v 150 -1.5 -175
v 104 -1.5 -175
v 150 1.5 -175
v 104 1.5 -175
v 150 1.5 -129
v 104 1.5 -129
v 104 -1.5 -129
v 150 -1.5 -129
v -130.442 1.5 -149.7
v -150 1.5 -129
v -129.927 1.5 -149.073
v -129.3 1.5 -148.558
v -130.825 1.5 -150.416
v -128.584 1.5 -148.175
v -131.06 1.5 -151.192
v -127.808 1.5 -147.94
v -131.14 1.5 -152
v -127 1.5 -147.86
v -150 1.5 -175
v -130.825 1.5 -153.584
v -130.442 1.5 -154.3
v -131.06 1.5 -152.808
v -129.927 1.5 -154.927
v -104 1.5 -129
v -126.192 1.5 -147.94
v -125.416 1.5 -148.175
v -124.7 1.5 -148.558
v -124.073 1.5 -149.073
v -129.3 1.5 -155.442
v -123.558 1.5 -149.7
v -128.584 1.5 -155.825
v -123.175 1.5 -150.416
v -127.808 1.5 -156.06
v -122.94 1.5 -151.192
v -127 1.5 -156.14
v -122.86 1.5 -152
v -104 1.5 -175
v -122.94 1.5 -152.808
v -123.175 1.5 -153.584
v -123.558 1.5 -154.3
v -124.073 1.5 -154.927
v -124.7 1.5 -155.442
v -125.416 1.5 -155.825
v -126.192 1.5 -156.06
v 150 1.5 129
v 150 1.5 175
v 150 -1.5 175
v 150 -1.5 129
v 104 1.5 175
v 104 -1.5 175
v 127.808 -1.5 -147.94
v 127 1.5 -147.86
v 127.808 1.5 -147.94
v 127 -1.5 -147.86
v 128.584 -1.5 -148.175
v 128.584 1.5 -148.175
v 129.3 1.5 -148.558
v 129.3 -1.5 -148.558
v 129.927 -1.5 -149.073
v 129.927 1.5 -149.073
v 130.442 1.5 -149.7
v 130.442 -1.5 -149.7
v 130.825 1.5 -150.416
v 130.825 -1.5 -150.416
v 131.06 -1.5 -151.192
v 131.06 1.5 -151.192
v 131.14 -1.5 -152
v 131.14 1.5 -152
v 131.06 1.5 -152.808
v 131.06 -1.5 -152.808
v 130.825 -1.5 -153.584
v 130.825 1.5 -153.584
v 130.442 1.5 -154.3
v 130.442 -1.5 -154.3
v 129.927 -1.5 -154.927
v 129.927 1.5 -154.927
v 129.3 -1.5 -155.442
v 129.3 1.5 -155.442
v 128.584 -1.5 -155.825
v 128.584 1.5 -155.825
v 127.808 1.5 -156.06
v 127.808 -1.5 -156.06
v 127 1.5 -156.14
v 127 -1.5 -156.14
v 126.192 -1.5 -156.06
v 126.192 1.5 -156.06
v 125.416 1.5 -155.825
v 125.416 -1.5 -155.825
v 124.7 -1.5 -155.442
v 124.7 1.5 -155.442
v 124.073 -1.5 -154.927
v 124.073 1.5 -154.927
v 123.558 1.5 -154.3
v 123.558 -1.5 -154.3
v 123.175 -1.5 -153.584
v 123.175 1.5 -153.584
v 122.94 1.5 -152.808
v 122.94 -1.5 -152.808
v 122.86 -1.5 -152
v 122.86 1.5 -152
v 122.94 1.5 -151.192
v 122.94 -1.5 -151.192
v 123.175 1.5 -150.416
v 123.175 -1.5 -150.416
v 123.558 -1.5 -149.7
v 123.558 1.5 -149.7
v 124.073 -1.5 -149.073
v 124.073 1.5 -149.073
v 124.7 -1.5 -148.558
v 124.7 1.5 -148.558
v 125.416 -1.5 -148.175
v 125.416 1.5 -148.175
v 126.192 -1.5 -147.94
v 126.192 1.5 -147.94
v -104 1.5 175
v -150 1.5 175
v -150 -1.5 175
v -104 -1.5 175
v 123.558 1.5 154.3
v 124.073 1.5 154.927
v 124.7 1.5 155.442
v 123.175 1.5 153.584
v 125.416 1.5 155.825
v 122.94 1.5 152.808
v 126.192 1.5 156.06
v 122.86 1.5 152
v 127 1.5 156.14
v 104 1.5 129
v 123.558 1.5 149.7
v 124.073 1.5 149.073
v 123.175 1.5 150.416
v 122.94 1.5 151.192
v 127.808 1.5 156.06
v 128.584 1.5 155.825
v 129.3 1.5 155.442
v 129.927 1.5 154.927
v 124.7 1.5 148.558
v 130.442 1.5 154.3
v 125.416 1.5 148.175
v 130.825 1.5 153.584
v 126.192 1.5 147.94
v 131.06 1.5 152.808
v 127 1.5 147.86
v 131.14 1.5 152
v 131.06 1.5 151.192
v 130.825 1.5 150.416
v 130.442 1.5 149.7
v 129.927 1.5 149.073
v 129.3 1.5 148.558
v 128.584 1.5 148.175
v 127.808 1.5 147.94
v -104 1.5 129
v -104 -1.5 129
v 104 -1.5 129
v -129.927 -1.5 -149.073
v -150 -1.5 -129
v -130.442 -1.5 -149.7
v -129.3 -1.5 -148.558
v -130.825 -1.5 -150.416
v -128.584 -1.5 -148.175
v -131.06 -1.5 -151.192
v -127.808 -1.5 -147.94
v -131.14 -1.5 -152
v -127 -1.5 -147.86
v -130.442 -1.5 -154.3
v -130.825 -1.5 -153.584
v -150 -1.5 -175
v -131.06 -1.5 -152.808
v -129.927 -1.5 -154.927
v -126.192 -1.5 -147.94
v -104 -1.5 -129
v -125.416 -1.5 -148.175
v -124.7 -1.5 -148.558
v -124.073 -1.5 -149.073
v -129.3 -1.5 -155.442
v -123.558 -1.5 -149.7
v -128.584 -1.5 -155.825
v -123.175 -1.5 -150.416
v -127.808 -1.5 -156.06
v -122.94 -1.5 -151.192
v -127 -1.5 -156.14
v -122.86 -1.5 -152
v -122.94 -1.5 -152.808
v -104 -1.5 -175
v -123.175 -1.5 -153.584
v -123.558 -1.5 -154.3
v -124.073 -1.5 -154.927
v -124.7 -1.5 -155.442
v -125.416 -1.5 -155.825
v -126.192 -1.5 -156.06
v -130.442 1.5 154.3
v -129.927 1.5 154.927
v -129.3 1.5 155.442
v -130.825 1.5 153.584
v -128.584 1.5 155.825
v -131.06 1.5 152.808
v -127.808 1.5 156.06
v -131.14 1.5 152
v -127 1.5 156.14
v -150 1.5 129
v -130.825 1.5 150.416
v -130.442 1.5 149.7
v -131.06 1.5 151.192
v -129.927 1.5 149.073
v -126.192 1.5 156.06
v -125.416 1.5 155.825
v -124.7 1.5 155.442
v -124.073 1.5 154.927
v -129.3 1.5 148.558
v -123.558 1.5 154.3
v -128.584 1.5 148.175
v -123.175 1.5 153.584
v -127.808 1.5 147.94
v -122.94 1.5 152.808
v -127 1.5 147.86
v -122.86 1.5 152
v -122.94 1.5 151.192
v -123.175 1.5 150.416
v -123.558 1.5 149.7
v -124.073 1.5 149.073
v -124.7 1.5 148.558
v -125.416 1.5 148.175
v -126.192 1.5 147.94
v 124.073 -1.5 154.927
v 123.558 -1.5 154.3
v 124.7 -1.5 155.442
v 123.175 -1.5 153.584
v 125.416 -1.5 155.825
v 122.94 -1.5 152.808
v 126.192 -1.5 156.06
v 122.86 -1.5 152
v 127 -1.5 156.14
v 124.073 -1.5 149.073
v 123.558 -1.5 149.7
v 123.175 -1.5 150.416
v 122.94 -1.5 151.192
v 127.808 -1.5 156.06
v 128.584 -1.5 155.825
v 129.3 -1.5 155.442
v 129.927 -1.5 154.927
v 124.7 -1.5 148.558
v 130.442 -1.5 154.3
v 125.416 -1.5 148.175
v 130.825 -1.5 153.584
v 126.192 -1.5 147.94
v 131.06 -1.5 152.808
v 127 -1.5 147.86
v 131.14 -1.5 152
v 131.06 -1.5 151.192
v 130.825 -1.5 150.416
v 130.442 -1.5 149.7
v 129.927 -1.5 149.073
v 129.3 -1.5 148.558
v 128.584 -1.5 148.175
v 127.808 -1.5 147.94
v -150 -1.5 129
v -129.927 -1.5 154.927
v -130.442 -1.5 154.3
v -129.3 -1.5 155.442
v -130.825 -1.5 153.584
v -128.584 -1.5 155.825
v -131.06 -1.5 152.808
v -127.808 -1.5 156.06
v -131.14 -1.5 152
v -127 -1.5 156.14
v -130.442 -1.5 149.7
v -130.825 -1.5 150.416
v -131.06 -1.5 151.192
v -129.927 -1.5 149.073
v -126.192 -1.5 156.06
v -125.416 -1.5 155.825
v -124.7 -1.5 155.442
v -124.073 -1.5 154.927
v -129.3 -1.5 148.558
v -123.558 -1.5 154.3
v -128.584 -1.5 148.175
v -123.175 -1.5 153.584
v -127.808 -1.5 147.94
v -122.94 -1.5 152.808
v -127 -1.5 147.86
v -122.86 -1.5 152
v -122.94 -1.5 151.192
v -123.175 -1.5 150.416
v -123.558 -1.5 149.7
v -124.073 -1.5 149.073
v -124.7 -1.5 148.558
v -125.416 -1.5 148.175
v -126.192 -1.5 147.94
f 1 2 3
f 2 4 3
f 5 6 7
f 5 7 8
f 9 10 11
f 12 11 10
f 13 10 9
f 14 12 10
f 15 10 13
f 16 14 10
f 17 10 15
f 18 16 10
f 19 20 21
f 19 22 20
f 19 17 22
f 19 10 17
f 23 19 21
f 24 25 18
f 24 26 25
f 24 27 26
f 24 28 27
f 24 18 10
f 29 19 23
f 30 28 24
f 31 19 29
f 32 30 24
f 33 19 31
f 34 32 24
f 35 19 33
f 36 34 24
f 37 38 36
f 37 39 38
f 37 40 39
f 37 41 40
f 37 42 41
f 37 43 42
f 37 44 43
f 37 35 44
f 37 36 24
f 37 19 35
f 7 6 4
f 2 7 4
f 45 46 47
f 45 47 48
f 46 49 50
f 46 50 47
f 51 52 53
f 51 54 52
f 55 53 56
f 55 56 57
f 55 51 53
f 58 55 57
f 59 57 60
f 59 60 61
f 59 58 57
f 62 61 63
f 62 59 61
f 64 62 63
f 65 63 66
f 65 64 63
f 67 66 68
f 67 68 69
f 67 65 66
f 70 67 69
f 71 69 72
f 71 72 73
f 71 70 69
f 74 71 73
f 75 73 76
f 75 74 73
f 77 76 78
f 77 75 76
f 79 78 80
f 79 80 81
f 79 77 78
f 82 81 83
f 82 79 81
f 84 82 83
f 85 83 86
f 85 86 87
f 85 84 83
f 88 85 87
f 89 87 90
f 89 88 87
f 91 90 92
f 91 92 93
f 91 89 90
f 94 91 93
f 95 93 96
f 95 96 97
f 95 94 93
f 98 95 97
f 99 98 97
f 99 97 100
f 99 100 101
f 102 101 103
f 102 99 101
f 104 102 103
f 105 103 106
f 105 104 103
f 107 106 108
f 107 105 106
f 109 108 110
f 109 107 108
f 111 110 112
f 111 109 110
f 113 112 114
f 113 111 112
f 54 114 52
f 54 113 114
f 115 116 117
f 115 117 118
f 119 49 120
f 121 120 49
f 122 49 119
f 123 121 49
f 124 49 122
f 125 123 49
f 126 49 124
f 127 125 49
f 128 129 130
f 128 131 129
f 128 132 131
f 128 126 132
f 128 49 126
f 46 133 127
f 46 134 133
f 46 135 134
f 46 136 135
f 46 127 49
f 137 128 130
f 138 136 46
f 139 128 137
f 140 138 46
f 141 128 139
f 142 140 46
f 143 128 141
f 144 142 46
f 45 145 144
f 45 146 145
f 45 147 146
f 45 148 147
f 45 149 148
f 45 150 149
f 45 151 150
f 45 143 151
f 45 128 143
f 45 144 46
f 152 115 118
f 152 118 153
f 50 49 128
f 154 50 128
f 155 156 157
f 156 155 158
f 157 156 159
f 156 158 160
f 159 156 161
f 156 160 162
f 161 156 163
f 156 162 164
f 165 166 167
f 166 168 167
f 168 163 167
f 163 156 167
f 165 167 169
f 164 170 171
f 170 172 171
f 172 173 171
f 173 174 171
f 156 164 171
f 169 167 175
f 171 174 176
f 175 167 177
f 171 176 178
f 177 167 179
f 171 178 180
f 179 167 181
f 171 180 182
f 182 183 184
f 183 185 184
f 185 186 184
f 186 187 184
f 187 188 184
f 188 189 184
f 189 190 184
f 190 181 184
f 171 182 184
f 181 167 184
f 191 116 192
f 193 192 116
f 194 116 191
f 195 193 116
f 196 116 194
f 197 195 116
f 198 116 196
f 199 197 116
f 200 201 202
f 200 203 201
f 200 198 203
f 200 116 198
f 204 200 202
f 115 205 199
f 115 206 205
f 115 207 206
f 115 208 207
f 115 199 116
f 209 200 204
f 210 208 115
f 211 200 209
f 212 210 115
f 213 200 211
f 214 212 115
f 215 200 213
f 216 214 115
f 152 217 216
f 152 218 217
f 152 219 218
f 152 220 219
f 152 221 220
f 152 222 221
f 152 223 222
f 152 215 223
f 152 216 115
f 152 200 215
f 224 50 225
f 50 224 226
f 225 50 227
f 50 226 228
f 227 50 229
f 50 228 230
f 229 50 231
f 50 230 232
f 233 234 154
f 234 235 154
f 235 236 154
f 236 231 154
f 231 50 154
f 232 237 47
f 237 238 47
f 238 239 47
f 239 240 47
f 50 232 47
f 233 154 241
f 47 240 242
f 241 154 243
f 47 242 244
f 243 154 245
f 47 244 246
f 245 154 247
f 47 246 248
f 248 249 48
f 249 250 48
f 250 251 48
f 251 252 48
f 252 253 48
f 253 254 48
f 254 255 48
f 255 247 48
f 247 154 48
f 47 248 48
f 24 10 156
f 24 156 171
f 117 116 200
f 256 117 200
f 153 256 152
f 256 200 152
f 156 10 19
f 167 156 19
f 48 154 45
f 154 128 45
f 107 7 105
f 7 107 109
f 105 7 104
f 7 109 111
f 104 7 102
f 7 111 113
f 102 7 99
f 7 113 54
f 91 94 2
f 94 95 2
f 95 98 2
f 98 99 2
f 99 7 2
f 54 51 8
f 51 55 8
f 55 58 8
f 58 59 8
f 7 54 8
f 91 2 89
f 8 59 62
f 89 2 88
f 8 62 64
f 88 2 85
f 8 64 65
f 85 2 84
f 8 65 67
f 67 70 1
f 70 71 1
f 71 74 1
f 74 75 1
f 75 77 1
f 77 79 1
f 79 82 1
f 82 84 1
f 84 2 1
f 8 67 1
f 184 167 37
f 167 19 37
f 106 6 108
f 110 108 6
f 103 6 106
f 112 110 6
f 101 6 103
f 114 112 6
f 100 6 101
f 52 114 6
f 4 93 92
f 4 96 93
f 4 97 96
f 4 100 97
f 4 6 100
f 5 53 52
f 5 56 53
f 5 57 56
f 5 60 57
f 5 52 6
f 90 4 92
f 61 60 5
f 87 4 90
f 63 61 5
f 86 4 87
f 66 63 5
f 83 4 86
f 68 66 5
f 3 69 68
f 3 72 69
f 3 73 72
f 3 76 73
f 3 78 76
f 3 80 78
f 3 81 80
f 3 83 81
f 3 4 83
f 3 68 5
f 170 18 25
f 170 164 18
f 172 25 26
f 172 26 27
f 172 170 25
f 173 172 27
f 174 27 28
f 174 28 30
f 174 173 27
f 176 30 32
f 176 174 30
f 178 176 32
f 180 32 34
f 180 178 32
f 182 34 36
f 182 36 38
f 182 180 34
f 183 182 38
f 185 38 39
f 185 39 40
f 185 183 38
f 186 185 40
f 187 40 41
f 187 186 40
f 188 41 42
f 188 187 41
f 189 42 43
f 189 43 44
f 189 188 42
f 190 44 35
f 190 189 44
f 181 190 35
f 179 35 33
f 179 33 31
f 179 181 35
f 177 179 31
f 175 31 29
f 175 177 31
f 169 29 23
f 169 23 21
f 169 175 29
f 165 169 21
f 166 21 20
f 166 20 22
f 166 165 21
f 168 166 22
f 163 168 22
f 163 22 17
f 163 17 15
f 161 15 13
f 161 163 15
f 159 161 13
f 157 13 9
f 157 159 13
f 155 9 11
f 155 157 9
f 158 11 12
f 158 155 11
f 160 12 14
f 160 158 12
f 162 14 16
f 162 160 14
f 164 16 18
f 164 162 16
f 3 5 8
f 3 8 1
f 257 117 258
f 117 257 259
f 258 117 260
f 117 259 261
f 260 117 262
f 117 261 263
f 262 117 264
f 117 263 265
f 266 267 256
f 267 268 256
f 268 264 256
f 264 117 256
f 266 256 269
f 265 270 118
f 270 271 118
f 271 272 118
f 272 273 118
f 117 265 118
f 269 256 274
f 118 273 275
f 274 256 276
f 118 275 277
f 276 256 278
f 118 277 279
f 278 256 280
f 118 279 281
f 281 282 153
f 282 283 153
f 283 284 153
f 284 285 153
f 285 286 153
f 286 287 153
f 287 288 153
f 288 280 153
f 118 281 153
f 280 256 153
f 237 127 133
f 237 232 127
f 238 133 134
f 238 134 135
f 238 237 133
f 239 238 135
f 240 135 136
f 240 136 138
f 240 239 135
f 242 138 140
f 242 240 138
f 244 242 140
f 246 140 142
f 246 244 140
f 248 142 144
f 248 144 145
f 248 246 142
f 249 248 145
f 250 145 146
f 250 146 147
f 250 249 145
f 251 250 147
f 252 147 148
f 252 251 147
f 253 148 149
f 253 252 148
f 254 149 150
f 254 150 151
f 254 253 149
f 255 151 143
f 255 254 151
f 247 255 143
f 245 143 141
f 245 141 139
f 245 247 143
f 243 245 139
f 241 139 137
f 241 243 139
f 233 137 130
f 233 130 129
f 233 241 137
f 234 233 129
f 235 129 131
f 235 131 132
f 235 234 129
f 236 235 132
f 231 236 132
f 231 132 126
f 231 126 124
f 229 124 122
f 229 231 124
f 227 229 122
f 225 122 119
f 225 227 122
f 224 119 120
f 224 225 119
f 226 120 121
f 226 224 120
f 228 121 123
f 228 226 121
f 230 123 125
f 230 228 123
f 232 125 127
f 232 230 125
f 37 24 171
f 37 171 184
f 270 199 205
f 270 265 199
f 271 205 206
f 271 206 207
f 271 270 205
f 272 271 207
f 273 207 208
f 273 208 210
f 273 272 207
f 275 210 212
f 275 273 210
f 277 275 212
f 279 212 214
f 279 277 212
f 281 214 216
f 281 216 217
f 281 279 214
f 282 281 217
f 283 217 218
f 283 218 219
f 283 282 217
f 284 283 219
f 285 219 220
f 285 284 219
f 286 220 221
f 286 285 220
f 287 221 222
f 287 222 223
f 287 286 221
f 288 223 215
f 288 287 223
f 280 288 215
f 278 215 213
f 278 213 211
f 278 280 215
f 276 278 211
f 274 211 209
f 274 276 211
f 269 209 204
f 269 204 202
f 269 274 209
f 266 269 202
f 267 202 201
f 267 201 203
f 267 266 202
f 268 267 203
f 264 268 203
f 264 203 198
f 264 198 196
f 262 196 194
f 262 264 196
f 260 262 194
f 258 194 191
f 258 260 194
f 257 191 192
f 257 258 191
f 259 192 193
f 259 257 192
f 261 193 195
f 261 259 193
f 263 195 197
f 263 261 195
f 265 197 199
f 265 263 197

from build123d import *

# Parameters (mm, degrees)
SKETCH1_W                            = 46
SKETCH1_H                            = 46
SKETCH1_R                            = 4.14
ELECTRONICS_TRAY_CORNER_TABS_DEPTH   = 1.5
ELECTRONICS_TRAY_CORNER_TABS_2_DEPTH = 1.5
ELECTRONICS_TRAY_CORNER_TABS_3_DEPTH = 1.5
ELECTRONICS_TRAY_CORNER_TABS_4_DEPTH = 1.5


with BuildPart() as part:
    # Sketch1 → Electronics tray corner tabs (new, symmetric)
    with BuildSketch(Plane(origin=(0, 0, 0), x_dir=(1, 0, 0), z_dir=(0, 1, 0))):
        with Locations((127, 152)):
            Rectangle(SKETCH1_W, SKETCH1_H)
        with Locations(Location((127, 152, 0), (0, 0, 270))):
            Circle(SKETCH1_R, mode=Mode.SUBTRACT)
    extrude(amount=ELECTRONICS_TRAY_CORNER_TABS_DEPTH, both=True)


with BuildPart() as body_2:
    # Sketch1 → Electronics tray corner tabs 2 (new, symmetric)
    with BuildSketch(Plane(origin=(0, 0, 0), x_dir=(1, 0, 0), z_dir=(0, 1, 0))):
        with Locations((-127, 152)):
            Rectangle(SKETCH1_W, SKETCH1_H)
        with Locations(Location((-127, 152, 0), (0, 0, 270))):
            Circle(SKETCH1_R, mode=Mode.SUBTRACT)
    extrude(amount=ELECTRONICS_TRAY_CORNER_TABS_2_DEPTH, both=True)


with BuildPart() as body_3:
    # Sketch1 → Electronics tray corner tabs 3 (new, symmetric)
    with BuildSketch(Plane(origin=(0, 0, 0), x_dir=(1, 0, 0), z_dir=(0, 1, 0))):
        with Locations((127, -152)):
            Rectangle(SKETCH1_W, SKETCH1_H)
        with Locations(Location((127, -152, 0), (0, 0, 270))):
            Circle(SKETCH1_R, mode=Mode.SUBTRACT)
    extrude(amount=ELECTRONICS_TRAY_CORNER_TABS_3_DEPTH, both=True)


with BuildPart() as body_4:
    # Sketch1 → Electronics tray corner tabs 4 (new, symmetric)
    with BuildSketch(Plane(origin=(0, 0, 0), x_dir=(1, 0, 0), z_dir=(0, 1, 0))):
        with Locations((-127, -152)):
            Rectangle(SKETCH1_W, SKETCH1_H)
        with Locations(Location((-127, -152, 0), (0, 0, 270))):
            Circle(SKETCH1_R, mode=Mode.SUBTRACT)
    extrude(amount=ELECTRONICS_TRAY_CORNER_TABS_4_DEPTH, both=True)


solid = Compound([part.part, body_2.part, body_3.part, body_4.part])
